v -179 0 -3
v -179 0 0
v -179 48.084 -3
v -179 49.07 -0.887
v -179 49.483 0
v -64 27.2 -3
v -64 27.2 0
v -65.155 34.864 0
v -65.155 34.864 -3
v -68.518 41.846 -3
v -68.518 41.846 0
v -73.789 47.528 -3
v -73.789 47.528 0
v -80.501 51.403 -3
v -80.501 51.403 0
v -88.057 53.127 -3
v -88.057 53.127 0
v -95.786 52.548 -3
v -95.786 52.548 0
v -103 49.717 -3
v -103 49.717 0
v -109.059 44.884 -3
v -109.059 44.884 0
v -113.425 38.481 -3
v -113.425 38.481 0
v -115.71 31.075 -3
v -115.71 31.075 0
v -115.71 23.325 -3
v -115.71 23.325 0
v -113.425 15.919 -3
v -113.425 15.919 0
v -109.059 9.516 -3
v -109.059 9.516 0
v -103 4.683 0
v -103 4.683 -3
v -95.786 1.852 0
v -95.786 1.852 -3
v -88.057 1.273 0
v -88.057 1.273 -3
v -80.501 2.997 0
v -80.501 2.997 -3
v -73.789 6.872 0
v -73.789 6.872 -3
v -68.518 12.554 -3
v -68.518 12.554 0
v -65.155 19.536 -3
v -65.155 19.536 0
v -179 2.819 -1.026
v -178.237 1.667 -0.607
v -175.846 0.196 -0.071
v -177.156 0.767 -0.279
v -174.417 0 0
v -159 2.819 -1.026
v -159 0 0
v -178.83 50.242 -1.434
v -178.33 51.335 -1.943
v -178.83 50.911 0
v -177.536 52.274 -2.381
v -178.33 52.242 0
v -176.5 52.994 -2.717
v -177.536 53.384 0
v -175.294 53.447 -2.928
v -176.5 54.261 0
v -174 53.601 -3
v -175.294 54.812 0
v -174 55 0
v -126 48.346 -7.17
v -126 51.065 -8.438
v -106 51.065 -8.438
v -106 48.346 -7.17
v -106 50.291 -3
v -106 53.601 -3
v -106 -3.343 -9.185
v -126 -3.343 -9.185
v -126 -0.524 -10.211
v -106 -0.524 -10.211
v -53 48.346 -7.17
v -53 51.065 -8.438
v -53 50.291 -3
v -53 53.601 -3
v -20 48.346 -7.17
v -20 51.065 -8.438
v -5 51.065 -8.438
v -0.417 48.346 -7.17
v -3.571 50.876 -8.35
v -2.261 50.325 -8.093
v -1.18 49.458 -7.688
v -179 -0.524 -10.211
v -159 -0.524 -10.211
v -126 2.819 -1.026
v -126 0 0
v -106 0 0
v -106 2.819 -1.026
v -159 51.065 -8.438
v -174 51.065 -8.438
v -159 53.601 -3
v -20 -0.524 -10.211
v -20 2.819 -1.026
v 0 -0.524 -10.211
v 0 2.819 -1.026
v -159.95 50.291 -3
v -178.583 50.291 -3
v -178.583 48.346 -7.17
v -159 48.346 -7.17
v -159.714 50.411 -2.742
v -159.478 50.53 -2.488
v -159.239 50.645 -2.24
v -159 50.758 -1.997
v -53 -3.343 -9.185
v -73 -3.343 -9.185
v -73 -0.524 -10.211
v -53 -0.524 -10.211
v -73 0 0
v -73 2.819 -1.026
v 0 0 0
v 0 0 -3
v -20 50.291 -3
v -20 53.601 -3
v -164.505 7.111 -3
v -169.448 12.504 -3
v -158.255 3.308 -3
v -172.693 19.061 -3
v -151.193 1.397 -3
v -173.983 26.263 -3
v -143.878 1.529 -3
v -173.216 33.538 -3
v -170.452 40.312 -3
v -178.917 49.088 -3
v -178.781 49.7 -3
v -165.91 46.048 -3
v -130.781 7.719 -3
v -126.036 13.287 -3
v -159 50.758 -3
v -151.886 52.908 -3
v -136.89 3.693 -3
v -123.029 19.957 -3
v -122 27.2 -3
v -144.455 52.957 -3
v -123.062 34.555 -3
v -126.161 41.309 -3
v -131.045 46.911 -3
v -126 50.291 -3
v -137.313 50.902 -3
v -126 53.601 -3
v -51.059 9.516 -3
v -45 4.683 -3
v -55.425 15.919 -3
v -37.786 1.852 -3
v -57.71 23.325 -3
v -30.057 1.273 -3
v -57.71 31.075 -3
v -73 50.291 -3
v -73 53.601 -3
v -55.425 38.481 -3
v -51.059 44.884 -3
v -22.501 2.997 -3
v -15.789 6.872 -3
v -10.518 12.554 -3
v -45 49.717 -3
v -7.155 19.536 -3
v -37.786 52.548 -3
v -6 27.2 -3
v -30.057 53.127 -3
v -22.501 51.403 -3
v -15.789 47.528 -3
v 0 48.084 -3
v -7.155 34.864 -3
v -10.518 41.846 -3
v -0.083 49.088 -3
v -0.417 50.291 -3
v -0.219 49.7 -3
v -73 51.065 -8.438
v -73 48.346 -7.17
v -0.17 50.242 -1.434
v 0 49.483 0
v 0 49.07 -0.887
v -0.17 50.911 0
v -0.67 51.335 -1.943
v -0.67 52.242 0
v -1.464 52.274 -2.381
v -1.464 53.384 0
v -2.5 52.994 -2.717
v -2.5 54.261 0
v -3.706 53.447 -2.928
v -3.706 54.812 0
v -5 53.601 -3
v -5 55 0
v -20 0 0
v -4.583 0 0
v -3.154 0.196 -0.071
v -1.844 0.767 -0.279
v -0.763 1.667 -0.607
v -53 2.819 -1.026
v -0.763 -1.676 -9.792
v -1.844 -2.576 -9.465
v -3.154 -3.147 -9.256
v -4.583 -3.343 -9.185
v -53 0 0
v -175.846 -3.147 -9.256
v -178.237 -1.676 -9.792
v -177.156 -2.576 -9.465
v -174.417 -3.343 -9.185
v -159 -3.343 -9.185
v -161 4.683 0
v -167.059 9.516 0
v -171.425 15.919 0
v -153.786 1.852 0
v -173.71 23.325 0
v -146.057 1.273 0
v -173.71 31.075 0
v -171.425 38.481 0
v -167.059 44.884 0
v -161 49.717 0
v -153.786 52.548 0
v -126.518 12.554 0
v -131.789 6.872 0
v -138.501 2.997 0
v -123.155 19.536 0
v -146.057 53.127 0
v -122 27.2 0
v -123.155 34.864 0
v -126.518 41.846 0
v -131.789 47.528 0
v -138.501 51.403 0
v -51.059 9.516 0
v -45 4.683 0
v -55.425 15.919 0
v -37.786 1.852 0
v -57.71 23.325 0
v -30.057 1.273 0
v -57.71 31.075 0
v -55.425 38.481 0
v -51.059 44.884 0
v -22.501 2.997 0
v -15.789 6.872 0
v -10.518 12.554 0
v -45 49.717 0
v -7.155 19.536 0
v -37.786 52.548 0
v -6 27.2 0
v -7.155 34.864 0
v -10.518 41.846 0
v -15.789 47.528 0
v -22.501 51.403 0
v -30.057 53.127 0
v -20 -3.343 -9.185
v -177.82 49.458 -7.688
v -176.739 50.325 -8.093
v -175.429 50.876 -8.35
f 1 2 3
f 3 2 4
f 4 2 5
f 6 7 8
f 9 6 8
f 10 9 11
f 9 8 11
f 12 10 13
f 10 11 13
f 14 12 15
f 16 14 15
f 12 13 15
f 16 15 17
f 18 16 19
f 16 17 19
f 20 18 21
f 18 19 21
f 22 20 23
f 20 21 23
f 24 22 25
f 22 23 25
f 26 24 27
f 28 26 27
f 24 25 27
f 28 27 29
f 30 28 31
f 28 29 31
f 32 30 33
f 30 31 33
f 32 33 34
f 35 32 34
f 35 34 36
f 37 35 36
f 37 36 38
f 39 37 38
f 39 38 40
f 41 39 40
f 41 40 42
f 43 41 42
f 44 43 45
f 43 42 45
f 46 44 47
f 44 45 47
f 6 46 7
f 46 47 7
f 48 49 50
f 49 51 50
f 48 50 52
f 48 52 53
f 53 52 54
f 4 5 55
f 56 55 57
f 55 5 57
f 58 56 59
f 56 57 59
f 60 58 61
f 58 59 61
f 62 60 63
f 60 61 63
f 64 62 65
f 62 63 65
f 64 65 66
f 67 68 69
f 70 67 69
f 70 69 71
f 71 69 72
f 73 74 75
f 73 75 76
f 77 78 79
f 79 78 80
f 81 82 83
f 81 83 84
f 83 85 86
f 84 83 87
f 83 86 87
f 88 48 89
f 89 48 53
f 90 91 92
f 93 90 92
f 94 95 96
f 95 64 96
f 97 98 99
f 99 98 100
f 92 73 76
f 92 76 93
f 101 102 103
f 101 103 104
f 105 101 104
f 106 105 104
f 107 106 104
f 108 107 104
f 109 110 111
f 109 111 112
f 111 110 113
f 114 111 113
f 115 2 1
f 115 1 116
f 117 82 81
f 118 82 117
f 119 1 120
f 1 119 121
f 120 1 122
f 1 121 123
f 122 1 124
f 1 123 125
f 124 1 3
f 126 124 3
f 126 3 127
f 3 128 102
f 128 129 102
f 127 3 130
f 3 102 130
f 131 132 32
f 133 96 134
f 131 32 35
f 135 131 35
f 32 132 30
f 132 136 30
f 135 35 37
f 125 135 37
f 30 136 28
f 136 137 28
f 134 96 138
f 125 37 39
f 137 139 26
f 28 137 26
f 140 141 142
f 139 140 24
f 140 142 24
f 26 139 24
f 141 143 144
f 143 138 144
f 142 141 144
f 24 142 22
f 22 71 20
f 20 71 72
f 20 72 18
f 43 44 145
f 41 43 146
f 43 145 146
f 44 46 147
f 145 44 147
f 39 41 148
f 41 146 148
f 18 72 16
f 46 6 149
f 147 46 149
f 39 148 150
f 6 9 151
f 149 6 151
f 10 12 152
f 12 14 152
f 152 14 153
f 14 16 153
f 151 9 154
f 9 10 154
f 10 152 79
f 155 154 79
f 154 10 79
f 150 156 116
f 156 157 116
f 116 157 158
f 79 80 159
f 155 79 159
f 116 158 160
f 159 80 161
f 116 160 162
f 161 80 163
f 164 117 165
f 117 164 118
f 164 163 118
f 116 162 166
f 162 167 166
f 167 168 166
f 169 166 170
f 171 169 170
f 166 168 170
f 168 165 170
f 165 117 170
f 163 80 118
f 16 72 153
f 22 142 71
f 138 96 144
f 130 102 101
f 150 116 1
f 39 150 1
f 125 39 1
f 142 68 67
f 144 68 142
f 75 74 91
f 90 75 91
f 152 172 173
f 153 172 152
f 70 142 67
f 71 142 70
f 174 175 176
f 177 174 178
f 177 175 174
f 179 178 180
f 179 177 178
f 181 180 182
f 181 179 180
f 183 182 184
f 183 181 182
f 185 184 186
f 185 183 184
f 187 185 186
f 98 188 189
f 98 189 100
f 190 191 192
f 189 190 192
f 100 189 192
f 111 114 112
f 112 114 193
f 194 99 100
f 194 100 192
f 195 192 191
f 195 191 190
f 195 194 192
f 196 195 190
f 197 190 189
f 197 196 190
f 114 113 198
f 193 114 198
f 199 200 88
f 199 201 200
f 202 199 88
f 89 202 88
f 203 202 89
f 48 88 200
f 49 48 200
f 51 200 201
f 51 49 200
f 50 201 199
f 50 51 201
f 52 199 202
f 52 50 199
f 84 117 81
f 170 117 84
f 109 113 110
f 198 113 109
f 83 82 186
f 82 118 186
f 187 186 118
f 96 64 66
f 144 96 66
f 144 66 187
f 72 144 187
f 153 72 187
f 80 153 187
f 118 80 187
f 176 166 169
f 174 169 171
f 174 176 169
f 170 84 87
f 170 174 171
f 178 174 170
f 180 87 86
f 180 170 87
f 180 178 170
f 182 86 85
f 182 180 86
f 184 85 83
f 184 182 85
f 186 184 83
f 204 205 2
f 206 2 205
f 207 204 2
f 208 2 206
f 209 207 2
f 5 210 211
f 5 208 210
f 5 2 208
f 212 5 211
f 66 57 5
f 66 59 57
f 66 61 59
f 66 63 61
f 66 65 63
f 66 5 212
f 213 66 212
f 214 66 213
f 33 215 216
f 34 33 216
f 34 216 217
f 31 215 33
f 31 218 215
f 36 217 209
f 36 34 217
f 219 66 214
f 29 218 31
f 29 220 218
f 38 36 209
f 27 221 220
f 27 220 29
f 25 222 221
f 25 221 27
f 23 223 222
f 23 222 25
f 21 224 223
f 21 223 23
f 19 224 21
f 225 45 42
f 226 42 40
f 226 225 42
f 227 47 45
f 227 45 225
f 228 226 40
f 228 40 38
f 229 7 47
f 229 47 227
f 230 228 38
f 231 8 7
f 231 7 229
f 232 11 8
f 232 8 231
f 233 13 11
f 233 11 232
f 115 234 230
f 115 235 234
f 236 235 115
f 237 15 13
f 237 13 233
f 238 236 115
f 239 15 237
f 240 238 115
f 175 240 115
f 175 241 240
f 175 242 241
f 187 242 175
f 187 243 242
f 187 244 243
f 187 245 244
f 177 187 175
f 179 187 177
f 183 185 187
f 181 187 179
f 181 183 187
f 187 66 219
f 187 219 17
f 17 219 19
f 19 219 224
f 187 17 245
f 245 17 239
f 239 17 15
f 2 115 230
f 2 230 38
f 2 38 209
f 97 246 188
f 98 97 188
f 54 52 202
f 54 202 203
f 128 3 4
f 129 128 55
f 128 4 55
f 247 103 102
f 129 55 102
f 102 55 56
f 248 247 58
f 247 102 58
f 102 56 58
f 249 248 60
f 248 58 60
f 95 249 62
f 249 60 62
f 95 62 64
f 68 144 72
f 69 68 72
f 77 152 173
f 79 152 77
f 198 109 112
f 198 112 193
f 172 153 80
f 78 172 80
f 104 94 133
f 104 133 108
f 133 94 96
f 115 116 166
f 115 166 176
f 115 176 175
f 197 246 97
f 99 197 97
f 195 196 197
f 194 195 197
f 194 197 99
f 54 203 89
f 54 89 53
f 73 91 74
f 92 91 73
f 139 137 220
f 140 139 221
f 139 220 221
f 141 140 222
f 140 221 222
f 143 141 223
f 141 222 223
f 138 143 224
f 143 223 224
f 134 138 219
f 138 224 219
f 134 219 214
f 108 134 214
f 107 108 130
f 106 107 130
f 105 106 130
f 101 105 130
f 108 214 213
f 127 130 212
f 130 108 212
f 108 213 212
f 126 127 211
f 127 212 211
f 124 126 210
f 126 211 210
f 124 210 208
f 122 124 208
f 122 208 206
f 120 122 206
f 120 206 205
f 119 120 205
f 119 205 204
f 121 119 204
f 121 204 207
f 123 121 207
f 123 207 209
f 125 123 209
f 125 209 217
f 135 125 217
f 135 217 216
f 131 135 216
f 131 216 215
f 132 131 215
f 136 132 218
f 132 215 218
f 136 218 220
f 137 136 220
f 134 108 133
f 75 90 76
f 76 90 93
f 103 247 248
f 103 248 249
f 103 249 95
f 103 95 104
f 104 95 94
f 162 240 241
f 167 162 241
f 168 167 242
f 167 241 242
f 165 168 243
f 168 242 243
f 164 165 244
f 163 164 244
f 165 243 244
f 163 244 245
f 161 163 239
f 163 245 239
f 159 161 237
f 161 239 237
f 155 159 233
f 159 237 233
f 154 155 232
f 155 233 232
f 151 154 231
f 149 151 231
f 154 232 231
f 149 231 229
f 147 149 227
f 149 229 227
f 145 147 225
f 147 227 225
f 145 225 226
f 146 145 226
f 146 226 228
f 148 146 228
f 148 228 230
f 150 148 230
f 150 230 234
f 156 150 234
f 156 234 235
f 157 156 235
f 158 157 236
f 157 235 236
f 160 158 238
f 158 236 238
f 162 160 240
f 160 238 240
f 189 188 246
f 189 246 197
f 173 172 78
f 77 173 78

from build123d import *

# Parameters (mm, degrees)
F0_W           = 179
F0_H           = 55
F0_R           = 26
F1_DEPTH       = 3
F7_DEPTH       = 179.001
F8_W           = 20
F8_H           = 6
F9_DEPTH       = 3
F10_W          = 20
F10_H          = 9.7746569663
F11_DEPTH      = 3
F12_F1_R       = 5
F12_F2_R       = 5
F12_2_T1_DEPTH = 32.6875354411
F12_3_T1_DEPTH = 32.6875354411


# Not quite as in the source:
# - a fillet or chamfer that OpenCascade refuses, or shapes differently, is made with other operations: its cross-section is extruded or revolved along the edge and cut away or added


with BuildPart() as f1:
    # F0 (on Top) → F1 (new body)
    with BuildSketch(Plane.XY):
        with Locations((-89.5, 27.5)):
            Rectangle(F0_W, F0_H)
        with Locations((-148, 27.2)):
            Circle(F0_R, mode=Mode.SUBTRACT)
        with Locations((-90, 27.2)):
            Circle(F0_R, mode=Mode.SUBTRACT)
        with Locations((-32, 27.2)):
            Circle(F0_R, mode=Mode.SUBTRACT)
    extrude(amount=-F1_DEPTH)

    # F6 (on offset) → F7 (cut, through all)
    with BuildSketch(Plane(origin=(-179, 0, 0), x_dir=(0, -1, 0), z_dir=(-1, 0, 0))):
        Polygon((-49.9016099183, -10.9335328137), (-55, 0), (-57.2723100997, -1.0595956012), (-52.2457129351, -11.8391680074), align=None)
    extrude(amount=-F7_DEPTH, mode=Mode.SUBTRACT)

    # F8 (on face) → F9 (join)
    with BuildSketch(Plane(origin=(0, 45.1766592664, -21.0662221858), x_dir=(1, 0, 0), z_dir=(0, -0.906307787, 0.4226182617))):
        with Locations((-10, 16.9338706389)):
            Rectangle(F8_W, F8_H)
        with Locations((-169, 16.9338706389)):
            Rectangle(F8_W, F8_H)
        with Locations((-116, 16.9338706389)):
            Rectangle(F8_W, F8_H)
        with Locations((-63, 16.9338706389)):
            Rectangle(F8_W, F8_H)
    extrude(amount=F9_DEPTH)

    # F12: fillet of radius 5 on 2 edges, made by hand

    # F12_f1
    f12_f1_edges = [f1.edges().sort_by_distance(p)[0] for p in [
        (-179, 53.0326837275, -4.2189233611),
    ]]
    fillet(f12_f1_edges, radius=F12_F1_R)

    # F12_f2
    f12_f2_edges = [f1.edges().sort_by_distance(p)[0] for p in [
        (0, 53.0326837275, -4.2189233611),
    ]]
    fillet(f12_f2_edges, radius=F12_F2_R)


with BuildPart() as f11:
    # F10 (on face) → F11 (new body)
    with BuildSketch(Plane(origin=(0, 0, 0), x_dir=(1, 0, 0), z_dir=(0, -0.9396926208, 0.3420201433))):
        with Locations((-10, -4.8873284832)):
            Rectangle(F10_W, F10_H)
    extrude(amount=-F11_DEPTH)

    # F12#2: fillet of radius 5 on 1 edges, made by hand

    # F12_2_s2 → F12_2_t1 (cut)
    with BuildSketch(Plane(origin=(0, -7.2614625666, -19.9507044338), x_dir=(1, 0, 0), z_dir=(0, 0.3420201433, 0.9396926208))):
        with BuildLine():
            ThreePointArc((0, 3), (-1.8439629074, 0.8166998673), (-4.582575695, 0))
            Line((-4.582575695, 0), (0, 0))
            Line((0, 0), (0, 3))
        make_face()
    extrude(amount=F12_2_T1_DEPTH, mode=Mode.SUBTRACT)


with BuildPart() as f11b:
    # F10 (on face) → F11, piece 2 (new body)
    with BuildSketch(Plane(origin=(0, 0, 0), x_dir=(1, 0, 0), z_dir=(0, -0.9396926208, 0.3420201433))):
        with Locations((-169, -4.8873284832)):
            Rectangle(F10_W, F10_H)
    extrude(amount=-F11_DEPTH)

    # F12#3: fillet of radius 5 on 1 edges, made by hand

    # F12_3_s2 → F12_3_t1 (cut)
    with BuildSketch(Plane(origin=(0, 3.91833299, 10.7655314119), x_dir=(1, 0, 0), z_dir=(0, -0.3420201433, -0.9396926208))):
        with BuildLine():
            ThreePointArc((-179, -3), (-177.1560370926, -0.8166998673), (-174.417424305, 0))
            Line((-174.417424305, 0), (-179, 0))
            Line((-179, 0), (-179, -3))
        make_face()
    extrude(amount=F12_3_T1_DEPTH, mode=Mode.SUBTRACT)


with BuildPart() as f11c:
    # F10 (on face) → F11, piece 3 (new body)
    with BuildSketch(Plane(origin=(0, 0, 0), x_dir=(1, 0, 0), z_dir=(0, -0.9396926208, 0.3420201433))):
        with Locations((-116, -4.8873284832)):
            Rectangle(F10_W, F10_H)
    extrude(amount=-F11_DEPTH)


with BuildPart() as f11d:
    # F10 (on face) → F11, piece 4 (new body)
    with BuildSketch(Plane(origin=(0, 0, 0), x_dir=(1, 0, 0), z_dir=(0, -0.9396926208, 0.3420201433))):
        with Locations((-63, -4.8873284832)):
            Rectangle(F10_W, F10_H)
    extrude(amount=-F11_DEPTH)


solid = Compound([f1.part, f11.part, f11b.part, f11c.part, f11d.part])
